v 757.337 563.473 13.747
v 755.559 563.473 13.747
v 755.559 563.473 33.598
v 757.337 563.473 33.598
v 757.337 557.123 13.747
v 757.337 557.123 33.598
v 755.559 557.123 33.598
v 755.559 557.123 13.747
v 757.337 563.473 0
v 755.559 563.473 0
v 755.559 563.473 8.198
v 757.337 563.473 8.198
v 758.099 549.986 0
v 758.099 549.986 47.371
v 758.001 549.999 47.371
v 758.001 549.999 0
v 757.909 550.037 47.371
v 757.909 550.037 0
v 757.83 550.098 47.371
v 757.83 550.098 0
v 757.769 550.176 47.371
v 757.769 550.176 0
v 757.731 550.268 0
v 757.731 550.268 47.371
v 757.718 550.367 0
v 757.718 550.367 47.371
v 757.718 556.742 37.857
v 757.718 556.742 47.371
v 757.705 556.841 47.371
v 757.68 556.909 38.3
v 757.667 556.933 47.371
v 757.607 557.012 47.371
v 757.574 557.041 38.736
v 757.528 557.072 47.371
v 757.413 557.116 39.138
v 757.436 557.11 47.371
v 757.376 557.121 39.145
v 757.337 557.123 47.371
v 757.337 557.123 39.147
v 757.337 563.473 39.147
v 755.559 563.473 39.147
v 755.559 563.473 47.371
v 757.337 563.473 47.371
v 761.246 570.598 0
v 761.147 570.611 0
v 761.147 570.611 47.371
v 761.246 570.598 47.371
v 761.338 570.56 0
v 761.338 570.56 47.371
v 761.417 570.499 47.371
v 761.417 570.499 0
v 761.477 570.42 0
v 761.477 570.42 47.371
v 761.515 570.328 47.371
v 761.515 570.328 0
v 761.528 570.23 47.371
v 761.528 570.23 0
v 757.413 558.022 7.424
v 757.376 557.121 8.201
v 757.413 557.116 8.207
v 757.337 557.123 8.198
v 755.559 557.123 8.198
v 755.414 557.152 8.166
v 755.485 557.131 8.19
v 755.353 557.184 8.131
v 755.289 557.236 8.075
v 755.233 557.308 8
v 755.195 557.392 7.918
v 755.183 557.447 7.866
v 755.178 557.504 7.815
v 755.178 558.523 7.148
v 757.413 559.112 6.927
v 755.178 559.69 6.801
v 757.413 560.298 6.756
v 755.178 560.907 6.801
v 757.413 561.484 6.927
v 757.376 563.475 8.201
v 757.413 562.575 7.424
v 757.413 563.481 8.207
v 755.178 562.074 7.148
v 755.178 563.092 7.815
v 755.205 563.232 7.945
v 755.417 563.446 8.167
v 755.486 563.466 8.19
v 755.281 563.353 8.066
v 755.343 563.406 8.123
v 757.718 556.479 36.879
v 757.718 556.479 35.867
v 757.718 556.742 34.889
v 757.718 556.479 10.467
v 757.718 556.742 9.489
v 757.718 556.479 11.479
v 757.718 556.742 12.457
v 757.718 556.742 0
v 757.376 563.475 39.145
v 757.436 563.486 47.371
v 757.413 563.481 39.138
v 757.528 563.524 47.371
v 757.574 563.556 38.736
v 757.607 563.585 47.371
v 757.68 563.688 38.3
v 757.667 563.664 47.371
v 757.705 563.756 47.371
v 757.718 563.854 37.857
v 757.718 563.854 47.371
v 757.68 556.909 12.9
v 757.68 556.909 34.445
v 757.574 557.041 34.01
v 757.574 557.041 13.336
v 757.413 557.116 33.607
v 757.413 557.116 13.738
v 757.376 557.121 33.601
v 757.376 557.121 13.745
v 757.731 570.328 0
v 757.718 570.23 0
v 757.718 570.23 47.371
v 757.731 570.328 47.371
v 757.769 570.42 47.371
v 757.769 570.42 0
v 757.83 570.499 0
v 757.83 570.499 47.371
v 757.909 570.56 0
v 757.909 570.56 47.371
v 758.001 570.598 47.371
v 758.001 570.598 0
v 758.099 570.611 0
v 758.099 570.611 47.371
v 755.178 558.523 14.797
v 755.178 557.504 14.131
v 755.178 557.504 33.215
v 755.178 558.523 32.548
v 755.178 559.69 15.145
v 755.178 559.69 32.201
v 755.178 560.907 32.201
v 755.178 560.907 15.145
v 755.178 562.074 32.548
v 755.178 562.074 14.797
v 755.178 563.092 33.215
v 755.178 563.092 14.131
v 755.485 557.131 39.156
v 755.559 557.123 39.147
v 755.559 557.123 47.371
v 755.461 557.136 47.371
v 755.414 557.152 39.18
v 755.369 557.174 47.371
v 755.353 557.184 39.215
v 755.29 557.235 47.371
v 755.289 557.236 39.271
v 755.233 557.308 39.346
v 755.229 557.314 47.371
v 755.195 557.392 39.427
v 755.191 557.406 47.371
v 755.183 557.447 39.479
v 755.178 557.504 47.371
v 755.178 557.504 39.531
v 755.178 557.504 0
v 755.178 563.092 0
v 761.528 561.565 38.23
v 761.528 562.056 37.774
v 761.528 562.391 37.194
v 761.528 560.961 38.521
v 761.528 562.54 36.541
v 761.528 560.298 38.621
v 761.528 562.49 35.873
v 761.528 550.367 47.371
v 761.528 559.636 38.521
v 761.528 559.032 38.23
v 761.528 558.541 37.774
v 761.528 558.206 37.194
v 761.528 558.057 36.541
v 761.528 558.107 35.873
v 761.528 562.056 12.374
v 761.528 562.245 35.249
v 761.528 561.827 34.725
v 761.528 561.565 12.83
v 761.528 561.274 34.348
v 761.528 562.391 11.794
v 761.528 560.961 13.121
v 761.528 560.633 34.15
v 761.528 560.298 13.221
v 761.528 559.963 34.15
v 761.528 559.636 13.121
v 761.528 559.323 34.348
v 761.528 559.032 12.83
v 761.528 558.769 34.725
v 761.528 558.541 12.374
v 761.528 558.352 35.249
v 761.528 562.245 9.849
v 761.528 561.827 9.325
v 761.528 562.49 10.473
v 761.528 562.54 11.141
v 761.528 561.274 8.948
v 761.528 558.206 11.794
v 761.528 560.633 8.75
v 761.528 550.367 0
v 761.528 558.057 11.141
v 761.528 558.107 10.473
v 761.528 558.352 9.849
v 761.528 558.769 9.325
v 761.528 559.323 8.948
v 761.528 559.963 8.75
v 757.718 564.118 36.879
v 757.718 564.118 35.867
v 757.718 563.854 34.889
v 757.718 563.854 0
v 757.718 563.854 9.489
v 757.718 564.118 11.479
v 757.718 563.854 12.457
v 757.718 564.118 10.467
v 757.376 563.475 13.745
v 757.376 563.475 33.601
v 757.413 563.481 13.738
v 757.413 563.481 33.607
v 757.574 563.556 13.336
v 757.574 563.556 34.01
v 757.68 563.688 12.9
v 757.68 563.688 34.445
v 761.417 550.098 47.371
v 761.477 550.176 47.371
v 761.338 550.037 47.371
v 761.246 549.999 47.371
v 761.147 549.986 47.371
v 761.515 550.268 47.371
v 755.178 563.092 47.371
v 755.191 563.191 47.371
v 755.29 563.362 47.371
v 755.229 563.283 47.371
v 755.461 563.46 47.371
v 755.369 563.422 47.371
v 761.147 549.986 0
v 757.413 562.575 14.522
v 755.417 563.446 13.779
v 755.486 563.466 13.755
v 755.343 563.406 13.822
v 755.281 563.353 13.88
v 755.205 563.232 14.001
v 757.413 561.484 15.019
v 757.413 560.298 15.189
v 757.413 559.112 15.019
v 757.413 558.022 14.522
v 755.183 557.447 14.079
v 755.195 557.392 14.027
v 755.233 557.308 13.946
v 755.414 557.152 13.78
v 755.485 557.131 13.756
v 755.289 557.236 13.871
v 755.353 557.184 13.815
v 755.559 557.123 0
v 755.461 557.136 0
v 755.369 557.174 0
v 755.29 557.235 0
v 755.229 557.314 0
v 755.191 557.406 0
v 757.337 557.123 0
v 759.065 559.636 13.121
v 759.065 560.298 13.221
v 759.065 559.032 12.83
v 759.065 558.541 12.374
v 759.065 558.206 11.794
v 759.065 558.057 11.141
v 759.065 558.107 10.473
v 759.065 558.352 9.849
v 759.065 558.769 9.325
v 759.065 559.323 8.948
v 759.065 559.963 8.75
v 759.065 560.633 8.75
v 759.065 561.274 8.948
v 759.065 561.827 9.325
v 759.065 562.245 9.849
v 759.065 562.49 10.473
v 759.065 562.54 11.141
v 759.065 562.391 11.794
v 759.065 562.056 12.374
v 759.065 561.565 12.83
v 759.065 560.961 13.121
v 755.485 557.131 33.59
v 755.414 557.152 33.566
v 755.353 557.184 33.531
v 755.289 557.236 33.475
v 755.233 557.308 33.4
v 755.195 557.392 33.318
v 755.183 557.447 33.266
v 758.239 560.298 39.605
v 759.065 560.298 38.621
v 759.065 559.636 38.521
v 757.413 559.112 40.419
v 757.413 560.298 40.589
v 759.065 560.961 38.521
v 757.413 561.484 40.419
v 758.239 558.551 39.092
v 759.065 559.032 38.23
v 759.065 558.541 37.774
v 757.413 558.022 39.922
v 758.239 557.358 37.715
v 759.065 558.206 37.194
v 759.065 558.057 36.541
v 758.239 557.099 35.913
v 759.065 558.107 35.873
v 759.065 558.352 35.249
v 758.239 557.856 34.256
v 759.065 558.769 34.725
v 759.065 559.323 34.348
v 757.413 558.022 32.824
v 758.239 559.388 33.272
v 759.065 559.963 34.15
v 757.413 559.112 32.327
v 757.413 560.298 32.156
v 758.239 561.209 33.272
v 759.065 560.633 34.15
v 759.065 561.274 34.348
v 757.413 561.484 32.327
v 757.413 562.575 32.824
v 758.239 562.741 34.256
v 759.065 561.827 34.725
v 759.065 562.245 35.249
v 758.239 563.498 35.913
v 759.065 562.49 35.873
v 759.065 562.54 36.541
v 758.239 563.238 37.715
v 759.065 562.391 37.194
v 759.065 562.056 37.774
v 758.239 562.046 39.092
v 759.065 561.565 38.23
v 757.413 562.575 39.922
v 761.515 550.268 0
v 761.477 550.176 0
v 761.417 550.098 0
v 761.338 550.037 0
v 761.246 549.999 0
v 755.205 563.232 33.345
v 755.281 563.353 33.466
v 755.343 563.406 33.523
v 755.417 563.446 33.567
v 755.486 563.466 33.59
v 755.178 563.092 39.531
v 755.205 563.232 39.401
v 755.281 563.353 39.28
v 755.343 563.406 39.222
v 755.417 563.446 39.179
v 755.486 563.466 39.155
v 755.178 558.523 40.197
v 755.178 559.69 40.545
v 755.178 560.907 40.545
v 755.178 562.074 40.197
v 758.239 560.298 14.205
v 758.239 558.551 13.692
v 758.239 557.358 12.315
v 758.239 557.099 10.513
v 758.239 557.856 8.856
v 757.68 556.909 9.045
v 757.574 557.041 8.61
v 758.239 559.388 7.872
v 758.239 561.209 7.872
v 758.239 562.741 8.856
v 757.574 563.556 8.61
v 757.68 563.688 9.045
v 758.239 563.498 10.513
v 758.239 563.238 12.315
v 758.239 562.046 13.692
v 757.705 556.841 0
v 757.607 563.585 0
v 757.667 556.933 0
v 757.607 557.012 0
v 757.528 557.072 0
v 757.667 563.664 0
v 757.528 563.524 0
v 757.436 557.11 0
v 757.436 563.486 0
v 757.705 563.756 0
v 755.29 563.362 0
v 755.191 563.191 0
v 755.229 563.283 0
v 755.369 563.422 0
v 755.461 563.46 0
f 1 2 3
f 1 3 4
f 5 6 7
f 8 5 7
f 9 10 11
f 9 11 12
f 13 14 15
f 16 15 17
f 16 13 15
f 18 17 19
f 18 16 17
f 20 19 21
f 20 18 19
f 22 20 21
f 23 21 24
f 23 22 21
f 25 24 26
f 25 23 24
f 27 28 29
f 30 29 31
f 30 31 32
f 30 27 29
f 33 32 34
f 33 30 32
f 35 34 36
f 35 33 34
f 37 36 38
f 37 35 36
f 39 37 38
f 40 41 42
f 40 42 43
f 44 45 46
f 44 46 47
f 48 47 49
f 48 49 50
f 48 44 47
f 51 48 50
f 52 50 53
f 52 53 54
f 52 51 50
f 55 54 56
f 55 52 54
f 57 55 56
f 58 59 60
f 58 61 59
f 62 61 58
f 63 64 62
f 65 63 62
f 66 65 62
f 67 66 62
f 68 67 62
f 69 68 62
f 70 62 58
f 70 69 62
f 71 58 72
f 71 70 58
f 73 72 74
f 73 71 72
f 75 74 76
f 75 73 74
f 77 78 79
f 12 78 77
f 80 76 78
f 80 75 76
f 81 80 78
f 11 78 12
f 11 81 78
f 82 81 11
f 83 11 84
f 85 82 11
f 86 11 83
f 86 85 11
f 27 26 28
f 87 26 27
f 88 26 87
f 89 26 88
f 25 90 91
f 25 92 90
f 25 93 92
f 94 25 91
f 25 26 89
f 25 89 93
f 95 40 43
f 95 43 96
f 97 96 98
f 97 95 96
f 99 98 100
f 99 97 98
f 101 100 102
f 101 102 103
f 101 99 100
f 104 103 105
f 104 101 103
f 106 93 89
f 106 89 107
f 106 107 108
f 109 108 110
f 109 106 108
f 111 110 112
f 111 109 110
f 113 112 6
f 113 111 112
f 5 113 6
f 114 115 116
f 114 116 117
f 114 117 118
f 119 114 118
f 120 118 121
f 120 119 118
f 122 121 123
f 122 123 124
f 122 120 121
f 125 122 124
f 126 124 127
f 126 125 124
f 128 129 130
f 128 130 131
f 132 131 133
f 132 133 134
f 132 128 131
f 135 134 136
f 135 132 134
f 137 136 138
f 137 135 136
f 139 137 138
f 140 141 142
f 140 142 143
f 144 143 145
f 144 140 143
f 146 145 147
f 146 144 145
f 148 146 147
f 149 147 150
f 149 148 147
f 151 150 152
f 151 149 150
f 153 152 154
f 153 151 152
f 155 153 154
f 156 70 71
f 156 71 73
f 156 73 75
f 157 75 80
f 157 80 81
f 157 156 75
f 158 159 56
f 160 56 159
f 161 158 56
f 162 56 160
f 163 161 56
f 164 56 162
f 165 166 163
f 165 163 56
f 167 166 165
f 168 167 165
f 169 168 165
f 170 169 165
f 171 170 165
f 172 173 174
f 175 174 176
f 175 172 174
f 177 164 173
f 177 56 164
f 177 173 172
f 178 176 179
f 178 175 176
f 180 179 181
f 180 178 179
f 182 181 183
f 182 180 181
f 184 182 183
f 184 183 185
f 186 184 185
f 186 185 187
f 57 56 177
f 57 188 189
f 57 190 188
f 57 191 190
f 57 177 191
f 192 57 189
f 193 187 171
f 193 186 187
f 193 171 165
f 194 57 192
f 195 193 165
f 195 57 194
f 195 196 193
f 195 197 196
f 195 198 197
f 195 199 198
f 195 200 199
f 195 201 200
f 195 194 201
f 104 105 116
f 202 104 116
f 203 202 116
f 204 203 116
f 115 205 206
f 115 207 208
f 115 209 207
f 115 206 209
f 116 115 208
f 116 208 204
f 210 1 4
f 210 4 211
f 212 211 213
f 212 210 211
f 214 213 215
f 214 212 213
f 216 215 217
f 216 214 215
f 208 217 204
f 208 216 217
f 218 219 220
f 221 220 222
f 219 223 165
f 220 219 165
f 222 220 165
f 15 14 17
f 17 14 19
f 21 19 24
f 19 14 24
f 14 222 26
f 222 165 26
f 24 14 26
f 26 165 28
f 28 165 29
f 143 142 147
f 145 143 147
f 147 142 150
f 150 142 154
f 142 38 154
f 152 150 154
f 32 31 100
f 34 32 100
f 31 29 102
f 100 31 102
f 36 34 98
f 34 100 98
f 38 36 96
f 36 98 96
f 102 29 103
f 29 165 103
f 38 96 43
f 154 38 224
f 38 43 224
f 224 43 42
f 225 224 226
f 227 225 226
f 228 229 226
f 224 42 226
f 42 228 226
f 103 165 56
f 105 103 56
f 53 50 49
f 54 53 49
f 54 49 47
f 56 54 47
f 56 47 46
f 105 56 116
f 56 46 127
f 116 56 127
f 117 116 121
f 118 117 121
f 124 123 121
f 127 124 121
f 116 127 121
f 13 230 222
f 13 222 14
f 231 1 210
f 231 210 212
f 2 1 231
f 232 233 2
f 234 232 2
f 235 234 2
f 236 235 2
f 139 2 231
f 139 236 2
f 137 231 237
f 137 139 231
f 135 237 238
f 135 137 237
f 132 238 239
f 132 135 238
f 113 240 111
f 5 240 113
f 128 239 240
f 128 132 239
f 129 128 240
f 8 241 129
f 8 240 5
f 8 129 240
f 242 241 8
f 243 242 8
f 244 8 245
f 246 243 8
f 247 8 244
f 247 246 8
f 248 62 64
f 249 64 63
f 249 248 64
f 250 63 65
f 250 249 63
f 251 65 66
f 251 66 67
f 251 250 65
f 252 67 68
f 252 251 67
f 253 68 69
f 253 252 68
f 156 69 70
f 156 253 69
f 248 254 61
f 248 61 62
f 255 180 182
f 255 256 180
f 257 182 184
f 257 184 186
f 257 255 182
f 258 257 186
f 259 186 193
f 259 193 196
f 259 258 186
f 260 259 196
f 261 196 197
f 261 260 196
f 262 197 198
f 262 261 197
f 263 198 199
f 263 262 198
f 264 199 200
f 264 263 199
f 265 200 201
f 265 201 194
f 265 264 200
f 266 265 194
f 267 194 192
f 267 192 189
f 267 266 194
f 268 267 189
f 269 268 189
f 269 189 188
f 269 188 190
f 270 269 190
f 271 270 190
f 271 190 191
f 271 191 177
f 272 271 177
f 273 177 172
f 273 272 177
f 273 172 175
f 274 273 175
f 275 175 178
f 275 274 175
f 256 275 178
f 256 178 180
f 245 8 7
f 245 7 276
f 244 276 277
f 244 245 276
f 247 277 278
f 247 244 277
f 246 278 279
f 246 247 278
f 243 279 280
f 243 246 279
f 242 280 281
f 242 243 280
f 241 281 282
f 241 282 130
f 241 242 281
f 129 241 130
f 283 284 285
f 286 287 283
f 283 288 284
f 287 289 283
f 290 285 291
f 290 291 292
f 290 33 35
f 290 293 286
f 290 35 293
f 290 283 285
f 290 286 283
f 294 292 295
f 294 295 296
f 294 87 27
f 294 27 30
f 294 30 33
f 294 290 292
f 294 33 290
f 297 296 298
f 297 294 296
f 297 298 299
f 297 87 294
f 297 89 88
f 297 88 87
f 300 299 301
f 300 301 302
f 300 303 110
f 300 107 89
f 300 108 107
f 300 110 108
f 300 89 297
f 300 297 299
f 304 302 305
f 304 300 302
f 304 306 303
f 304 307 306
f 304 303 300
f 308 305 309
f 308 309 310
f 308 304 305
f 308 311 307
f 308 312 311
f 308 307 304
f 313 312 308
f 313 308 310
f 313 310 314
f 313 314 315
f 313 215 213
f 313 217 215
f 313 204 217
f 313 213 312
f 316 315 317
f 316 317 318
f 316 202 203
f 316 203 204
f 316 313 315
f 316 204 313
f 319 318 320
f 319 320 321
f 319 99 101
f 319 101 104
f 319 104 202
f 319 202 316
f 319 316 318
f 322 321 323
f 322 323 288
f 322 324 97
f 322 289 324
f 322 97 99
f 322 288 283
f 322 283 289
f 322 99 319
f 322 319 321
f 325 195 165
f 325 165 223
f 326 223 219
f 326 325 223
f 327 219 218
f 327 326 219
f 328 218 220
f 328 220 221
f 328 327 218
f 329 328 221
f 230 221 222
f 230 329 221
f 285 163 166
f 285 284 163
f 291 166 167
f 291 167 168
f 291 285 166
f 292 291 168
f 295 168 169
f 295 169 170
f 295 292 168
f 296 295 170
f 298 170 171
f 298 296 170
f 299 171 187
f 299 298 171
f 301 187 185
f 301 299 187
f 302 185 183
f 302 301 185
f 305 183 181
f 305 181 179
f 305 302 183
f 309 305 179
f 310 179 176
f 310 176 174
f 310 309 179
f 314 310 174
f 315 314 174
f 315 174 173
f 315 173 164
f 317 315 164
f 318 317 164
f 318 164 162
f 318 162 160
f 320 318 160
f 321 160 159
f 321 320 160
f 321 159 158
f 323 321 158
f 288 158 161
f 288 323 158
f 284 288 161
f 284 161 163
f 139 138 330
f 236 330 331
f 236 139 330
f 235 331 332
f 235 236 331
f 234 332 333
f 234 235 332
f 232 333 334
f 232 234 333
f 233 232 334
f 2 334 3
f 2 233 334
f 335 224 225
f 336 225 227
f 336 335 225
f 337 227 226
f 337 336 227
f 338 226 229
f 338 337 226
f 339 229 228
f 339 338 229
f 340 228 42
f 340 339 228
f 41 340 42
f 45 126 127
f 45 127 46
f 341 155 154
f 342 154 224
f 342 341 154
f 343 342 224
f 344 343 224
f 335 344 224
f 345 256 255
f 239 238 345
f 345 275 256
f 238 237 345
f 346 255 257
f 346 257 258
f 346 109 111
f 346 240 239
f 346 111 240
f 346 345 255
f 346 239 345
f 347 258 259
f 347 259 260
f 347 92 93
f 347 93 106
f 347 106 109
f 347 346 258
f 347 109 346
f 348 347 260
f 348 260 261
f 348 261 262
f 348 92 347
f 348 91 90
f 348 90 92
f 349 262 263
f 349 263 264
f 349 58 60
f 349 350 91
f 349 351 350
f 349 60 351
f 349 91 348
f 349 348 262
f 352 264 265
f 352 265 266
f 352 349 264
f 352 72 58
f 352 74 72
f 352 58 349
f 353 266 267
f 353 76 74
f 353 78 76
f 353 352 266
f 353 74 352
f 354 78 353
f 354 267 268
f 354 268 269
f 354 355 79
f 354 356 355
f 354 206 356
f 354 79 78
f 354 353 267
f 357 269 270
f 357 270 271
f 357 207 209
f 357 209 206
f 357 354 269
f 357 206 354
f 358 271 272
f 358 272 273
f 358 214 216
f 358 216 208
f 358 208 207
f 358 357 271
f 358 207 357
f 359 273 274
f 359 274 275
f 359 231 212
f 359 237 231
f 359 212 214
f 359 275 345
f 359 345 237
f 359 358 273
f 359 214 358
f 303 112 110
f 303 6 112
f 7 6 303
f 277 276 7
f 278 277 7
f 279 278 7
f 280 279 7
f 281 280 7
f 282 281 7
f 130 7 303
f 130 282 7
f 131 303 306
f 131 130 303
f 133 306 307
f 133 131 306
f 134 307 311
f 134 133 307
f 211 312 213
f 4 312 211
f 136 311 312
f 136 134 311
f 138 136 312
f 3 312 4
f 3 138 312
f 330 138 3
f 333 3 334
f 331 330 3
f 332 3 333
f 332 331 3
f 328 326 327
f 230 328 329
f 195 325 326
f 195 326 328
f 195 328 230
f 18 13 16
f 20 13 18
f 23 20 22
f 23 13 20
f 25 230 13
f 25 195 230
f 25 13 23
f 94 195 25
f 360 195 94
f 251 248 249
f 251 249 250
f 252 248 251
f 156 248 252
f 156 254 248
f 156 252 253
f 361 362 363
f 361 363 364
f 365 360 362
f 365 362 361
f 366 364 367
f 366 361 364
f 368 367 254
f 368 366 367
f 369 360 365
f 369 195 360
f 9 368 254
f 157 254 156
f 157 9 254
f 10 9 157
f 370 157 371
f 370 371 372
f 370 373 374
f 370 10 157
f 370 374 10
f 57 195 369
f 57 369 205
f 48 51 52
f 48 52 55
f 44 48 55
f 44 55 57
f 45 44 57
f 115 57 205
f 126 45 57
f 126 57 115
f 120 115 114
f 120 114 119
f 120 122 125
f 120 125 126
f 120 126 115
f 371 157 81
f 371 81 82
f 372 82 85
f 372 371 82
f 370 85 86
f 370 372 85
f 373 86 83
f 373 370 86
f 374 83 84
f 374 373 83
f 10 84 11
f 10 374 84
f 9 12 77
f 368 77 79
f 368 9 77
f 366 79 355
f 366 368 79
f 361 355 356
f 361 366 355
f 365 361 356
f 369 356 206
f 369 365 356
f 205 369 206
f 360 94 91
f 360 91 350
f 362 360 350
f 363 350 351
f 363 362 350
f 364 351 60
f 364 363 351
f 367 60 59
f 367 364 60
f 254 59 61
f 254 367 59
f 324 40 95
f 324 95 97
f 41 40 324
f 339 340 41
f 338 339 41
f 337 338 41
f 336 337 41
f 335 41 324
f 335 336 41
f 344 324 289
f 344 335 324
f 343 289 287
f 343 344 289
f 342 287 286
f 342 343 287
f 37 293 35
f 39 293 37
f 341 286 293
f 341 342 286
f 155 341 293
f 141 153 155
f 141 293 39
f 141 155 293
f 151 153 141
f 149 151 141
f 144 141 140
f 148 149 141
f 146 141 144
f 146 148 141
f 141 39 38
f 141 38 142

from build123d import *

# Parameters (mm, degrees)
EXTRUDE1_DEPTH                            = 47.371
SKETCH2_R                                 = 1.3843
CUT_EXTRUDE1_DEPTH                        = 7.35
CSK_FOR_8_FLAT_HEAD_MACHINE_SCREW_2_COUNT = 2
CSK_FOR_8_FLAT_HEAD_MACHINE_SCREW_2_PITCH = 25.4


with BuildPart() as part:
    # Sketch1 → Extrude1 (new body)
    with BuildSketch(Plane.XY):
        with BuildLine():
            Line((761.528249985, 570.229723122), (761.528249985, 550.366923122))
            ThreePointArc((761.528249985, 550.366923122), (761.416657669, 550.097515438), (761.147249985, 549.985923122))
            Line((761.147249985, 549.985923122), (758.099249985, 549.985923122))
            ThreePointArc((758.099249985, 549.985923122), (757.829842301, 550.097515438), (757.718249985, 550.366923122))
            Line((757.718249985, 550.366923122), (757.718249985, 556.742323122))
            ThreePointArc((757.718249985, 556.742323122), (757.606657669, 557.011730805), (757.337249985, 557.123323122))
            Line((757.337249985, 557.123323122), (755.559249985, 557.123323122))
            ThreePointArc((755.559249985, 557.123323122), (755.289842301, 557.234915438), (755.178249985, 557.504323122))
            Line((755.178249985, 557.504323122), (755.178249985, 563.092323122))
            ThreePointArc((755.178249985, 563.092323122), (755.289842301, 563.361730805), (755.559249985, 563.473323122))
            Line((755.559249985, 563.473323122), (757.337249985, 563.473323122))
            ThreePointArc((757.337249985, 563.473323122), (757.606657669, 563.584915438), (757.718249985, 563.854323122))
            Line((757.718249985, 563.854323122), (757.718249985, 570.229723122))
            ThreePointArc((757.718249985, 570.229723122), (757.829842301, 570.499130805), (758.099249985, 570.610723122))
            Line((758.099249985, 570.610723122), (761.147249985, 570.610723122))
            ThreePointArc((761.147249985, 570.610723122), (761.416657669, 570.499130805), (761.528249985, 570.229723122))
        make_face()
    extrude(amount=EXTRUDE1_DEPTH)

    # Sketch2 → Cut-Extrude1 (cut, through all)
    with BuildSketch(Plane.ZY.offset(-755.178249985)):
        with Locations((10.9728, 560.298323122)):
            Circle(SKETCH2_R)
        with Locations((36.3728, 560.298323122)):
            Circle(SKETCH2_R)
    extrude(amount=-CUT_EXTRUDE1_DEPTH, mode=Mode.SUBTRACT)

    # Sketch3 → CSK for #8 Flat Head Machine Screw (100)1 (revolve, cut)
    with BuildSketch(Plane(origin=(755.178249985, 560.298323122, 10.9728), x_dir=(0, 0, 1), z_dir=(0, 1, 0))):
        Polygon((0, 0), (0, 6.35), (2.2479, 6.35), (2.2479, 3.886967624), (4.2164, 2.2352), (4.2164, 0), align=None)
    csk_for_8_flat_head_machine_screw_100 = revolve(axis=Axis((748.828249985, 560.298323122, 10.9728), (1, 0, 0)), mode=Mode.SUBTRACT)

    # CSK for _8 Flat Head Machine Screw _ 2: CSK for #8 Flat Head Machine Screw (100)1 ×2
    with Locations(*[(0, 0, i * CSK_FOR_8_FLAT_HEAD_MACHINE_SCREW_2_PITCH) for i in range(1, CSK_FOR_8_FLAT_HEAD_MACHINE_SCREW_2_COUNT)]):
        add(csk_for_8_flat_head_machine_screw_100, mode=Mode.SUBTRACT)


solid = part.part
